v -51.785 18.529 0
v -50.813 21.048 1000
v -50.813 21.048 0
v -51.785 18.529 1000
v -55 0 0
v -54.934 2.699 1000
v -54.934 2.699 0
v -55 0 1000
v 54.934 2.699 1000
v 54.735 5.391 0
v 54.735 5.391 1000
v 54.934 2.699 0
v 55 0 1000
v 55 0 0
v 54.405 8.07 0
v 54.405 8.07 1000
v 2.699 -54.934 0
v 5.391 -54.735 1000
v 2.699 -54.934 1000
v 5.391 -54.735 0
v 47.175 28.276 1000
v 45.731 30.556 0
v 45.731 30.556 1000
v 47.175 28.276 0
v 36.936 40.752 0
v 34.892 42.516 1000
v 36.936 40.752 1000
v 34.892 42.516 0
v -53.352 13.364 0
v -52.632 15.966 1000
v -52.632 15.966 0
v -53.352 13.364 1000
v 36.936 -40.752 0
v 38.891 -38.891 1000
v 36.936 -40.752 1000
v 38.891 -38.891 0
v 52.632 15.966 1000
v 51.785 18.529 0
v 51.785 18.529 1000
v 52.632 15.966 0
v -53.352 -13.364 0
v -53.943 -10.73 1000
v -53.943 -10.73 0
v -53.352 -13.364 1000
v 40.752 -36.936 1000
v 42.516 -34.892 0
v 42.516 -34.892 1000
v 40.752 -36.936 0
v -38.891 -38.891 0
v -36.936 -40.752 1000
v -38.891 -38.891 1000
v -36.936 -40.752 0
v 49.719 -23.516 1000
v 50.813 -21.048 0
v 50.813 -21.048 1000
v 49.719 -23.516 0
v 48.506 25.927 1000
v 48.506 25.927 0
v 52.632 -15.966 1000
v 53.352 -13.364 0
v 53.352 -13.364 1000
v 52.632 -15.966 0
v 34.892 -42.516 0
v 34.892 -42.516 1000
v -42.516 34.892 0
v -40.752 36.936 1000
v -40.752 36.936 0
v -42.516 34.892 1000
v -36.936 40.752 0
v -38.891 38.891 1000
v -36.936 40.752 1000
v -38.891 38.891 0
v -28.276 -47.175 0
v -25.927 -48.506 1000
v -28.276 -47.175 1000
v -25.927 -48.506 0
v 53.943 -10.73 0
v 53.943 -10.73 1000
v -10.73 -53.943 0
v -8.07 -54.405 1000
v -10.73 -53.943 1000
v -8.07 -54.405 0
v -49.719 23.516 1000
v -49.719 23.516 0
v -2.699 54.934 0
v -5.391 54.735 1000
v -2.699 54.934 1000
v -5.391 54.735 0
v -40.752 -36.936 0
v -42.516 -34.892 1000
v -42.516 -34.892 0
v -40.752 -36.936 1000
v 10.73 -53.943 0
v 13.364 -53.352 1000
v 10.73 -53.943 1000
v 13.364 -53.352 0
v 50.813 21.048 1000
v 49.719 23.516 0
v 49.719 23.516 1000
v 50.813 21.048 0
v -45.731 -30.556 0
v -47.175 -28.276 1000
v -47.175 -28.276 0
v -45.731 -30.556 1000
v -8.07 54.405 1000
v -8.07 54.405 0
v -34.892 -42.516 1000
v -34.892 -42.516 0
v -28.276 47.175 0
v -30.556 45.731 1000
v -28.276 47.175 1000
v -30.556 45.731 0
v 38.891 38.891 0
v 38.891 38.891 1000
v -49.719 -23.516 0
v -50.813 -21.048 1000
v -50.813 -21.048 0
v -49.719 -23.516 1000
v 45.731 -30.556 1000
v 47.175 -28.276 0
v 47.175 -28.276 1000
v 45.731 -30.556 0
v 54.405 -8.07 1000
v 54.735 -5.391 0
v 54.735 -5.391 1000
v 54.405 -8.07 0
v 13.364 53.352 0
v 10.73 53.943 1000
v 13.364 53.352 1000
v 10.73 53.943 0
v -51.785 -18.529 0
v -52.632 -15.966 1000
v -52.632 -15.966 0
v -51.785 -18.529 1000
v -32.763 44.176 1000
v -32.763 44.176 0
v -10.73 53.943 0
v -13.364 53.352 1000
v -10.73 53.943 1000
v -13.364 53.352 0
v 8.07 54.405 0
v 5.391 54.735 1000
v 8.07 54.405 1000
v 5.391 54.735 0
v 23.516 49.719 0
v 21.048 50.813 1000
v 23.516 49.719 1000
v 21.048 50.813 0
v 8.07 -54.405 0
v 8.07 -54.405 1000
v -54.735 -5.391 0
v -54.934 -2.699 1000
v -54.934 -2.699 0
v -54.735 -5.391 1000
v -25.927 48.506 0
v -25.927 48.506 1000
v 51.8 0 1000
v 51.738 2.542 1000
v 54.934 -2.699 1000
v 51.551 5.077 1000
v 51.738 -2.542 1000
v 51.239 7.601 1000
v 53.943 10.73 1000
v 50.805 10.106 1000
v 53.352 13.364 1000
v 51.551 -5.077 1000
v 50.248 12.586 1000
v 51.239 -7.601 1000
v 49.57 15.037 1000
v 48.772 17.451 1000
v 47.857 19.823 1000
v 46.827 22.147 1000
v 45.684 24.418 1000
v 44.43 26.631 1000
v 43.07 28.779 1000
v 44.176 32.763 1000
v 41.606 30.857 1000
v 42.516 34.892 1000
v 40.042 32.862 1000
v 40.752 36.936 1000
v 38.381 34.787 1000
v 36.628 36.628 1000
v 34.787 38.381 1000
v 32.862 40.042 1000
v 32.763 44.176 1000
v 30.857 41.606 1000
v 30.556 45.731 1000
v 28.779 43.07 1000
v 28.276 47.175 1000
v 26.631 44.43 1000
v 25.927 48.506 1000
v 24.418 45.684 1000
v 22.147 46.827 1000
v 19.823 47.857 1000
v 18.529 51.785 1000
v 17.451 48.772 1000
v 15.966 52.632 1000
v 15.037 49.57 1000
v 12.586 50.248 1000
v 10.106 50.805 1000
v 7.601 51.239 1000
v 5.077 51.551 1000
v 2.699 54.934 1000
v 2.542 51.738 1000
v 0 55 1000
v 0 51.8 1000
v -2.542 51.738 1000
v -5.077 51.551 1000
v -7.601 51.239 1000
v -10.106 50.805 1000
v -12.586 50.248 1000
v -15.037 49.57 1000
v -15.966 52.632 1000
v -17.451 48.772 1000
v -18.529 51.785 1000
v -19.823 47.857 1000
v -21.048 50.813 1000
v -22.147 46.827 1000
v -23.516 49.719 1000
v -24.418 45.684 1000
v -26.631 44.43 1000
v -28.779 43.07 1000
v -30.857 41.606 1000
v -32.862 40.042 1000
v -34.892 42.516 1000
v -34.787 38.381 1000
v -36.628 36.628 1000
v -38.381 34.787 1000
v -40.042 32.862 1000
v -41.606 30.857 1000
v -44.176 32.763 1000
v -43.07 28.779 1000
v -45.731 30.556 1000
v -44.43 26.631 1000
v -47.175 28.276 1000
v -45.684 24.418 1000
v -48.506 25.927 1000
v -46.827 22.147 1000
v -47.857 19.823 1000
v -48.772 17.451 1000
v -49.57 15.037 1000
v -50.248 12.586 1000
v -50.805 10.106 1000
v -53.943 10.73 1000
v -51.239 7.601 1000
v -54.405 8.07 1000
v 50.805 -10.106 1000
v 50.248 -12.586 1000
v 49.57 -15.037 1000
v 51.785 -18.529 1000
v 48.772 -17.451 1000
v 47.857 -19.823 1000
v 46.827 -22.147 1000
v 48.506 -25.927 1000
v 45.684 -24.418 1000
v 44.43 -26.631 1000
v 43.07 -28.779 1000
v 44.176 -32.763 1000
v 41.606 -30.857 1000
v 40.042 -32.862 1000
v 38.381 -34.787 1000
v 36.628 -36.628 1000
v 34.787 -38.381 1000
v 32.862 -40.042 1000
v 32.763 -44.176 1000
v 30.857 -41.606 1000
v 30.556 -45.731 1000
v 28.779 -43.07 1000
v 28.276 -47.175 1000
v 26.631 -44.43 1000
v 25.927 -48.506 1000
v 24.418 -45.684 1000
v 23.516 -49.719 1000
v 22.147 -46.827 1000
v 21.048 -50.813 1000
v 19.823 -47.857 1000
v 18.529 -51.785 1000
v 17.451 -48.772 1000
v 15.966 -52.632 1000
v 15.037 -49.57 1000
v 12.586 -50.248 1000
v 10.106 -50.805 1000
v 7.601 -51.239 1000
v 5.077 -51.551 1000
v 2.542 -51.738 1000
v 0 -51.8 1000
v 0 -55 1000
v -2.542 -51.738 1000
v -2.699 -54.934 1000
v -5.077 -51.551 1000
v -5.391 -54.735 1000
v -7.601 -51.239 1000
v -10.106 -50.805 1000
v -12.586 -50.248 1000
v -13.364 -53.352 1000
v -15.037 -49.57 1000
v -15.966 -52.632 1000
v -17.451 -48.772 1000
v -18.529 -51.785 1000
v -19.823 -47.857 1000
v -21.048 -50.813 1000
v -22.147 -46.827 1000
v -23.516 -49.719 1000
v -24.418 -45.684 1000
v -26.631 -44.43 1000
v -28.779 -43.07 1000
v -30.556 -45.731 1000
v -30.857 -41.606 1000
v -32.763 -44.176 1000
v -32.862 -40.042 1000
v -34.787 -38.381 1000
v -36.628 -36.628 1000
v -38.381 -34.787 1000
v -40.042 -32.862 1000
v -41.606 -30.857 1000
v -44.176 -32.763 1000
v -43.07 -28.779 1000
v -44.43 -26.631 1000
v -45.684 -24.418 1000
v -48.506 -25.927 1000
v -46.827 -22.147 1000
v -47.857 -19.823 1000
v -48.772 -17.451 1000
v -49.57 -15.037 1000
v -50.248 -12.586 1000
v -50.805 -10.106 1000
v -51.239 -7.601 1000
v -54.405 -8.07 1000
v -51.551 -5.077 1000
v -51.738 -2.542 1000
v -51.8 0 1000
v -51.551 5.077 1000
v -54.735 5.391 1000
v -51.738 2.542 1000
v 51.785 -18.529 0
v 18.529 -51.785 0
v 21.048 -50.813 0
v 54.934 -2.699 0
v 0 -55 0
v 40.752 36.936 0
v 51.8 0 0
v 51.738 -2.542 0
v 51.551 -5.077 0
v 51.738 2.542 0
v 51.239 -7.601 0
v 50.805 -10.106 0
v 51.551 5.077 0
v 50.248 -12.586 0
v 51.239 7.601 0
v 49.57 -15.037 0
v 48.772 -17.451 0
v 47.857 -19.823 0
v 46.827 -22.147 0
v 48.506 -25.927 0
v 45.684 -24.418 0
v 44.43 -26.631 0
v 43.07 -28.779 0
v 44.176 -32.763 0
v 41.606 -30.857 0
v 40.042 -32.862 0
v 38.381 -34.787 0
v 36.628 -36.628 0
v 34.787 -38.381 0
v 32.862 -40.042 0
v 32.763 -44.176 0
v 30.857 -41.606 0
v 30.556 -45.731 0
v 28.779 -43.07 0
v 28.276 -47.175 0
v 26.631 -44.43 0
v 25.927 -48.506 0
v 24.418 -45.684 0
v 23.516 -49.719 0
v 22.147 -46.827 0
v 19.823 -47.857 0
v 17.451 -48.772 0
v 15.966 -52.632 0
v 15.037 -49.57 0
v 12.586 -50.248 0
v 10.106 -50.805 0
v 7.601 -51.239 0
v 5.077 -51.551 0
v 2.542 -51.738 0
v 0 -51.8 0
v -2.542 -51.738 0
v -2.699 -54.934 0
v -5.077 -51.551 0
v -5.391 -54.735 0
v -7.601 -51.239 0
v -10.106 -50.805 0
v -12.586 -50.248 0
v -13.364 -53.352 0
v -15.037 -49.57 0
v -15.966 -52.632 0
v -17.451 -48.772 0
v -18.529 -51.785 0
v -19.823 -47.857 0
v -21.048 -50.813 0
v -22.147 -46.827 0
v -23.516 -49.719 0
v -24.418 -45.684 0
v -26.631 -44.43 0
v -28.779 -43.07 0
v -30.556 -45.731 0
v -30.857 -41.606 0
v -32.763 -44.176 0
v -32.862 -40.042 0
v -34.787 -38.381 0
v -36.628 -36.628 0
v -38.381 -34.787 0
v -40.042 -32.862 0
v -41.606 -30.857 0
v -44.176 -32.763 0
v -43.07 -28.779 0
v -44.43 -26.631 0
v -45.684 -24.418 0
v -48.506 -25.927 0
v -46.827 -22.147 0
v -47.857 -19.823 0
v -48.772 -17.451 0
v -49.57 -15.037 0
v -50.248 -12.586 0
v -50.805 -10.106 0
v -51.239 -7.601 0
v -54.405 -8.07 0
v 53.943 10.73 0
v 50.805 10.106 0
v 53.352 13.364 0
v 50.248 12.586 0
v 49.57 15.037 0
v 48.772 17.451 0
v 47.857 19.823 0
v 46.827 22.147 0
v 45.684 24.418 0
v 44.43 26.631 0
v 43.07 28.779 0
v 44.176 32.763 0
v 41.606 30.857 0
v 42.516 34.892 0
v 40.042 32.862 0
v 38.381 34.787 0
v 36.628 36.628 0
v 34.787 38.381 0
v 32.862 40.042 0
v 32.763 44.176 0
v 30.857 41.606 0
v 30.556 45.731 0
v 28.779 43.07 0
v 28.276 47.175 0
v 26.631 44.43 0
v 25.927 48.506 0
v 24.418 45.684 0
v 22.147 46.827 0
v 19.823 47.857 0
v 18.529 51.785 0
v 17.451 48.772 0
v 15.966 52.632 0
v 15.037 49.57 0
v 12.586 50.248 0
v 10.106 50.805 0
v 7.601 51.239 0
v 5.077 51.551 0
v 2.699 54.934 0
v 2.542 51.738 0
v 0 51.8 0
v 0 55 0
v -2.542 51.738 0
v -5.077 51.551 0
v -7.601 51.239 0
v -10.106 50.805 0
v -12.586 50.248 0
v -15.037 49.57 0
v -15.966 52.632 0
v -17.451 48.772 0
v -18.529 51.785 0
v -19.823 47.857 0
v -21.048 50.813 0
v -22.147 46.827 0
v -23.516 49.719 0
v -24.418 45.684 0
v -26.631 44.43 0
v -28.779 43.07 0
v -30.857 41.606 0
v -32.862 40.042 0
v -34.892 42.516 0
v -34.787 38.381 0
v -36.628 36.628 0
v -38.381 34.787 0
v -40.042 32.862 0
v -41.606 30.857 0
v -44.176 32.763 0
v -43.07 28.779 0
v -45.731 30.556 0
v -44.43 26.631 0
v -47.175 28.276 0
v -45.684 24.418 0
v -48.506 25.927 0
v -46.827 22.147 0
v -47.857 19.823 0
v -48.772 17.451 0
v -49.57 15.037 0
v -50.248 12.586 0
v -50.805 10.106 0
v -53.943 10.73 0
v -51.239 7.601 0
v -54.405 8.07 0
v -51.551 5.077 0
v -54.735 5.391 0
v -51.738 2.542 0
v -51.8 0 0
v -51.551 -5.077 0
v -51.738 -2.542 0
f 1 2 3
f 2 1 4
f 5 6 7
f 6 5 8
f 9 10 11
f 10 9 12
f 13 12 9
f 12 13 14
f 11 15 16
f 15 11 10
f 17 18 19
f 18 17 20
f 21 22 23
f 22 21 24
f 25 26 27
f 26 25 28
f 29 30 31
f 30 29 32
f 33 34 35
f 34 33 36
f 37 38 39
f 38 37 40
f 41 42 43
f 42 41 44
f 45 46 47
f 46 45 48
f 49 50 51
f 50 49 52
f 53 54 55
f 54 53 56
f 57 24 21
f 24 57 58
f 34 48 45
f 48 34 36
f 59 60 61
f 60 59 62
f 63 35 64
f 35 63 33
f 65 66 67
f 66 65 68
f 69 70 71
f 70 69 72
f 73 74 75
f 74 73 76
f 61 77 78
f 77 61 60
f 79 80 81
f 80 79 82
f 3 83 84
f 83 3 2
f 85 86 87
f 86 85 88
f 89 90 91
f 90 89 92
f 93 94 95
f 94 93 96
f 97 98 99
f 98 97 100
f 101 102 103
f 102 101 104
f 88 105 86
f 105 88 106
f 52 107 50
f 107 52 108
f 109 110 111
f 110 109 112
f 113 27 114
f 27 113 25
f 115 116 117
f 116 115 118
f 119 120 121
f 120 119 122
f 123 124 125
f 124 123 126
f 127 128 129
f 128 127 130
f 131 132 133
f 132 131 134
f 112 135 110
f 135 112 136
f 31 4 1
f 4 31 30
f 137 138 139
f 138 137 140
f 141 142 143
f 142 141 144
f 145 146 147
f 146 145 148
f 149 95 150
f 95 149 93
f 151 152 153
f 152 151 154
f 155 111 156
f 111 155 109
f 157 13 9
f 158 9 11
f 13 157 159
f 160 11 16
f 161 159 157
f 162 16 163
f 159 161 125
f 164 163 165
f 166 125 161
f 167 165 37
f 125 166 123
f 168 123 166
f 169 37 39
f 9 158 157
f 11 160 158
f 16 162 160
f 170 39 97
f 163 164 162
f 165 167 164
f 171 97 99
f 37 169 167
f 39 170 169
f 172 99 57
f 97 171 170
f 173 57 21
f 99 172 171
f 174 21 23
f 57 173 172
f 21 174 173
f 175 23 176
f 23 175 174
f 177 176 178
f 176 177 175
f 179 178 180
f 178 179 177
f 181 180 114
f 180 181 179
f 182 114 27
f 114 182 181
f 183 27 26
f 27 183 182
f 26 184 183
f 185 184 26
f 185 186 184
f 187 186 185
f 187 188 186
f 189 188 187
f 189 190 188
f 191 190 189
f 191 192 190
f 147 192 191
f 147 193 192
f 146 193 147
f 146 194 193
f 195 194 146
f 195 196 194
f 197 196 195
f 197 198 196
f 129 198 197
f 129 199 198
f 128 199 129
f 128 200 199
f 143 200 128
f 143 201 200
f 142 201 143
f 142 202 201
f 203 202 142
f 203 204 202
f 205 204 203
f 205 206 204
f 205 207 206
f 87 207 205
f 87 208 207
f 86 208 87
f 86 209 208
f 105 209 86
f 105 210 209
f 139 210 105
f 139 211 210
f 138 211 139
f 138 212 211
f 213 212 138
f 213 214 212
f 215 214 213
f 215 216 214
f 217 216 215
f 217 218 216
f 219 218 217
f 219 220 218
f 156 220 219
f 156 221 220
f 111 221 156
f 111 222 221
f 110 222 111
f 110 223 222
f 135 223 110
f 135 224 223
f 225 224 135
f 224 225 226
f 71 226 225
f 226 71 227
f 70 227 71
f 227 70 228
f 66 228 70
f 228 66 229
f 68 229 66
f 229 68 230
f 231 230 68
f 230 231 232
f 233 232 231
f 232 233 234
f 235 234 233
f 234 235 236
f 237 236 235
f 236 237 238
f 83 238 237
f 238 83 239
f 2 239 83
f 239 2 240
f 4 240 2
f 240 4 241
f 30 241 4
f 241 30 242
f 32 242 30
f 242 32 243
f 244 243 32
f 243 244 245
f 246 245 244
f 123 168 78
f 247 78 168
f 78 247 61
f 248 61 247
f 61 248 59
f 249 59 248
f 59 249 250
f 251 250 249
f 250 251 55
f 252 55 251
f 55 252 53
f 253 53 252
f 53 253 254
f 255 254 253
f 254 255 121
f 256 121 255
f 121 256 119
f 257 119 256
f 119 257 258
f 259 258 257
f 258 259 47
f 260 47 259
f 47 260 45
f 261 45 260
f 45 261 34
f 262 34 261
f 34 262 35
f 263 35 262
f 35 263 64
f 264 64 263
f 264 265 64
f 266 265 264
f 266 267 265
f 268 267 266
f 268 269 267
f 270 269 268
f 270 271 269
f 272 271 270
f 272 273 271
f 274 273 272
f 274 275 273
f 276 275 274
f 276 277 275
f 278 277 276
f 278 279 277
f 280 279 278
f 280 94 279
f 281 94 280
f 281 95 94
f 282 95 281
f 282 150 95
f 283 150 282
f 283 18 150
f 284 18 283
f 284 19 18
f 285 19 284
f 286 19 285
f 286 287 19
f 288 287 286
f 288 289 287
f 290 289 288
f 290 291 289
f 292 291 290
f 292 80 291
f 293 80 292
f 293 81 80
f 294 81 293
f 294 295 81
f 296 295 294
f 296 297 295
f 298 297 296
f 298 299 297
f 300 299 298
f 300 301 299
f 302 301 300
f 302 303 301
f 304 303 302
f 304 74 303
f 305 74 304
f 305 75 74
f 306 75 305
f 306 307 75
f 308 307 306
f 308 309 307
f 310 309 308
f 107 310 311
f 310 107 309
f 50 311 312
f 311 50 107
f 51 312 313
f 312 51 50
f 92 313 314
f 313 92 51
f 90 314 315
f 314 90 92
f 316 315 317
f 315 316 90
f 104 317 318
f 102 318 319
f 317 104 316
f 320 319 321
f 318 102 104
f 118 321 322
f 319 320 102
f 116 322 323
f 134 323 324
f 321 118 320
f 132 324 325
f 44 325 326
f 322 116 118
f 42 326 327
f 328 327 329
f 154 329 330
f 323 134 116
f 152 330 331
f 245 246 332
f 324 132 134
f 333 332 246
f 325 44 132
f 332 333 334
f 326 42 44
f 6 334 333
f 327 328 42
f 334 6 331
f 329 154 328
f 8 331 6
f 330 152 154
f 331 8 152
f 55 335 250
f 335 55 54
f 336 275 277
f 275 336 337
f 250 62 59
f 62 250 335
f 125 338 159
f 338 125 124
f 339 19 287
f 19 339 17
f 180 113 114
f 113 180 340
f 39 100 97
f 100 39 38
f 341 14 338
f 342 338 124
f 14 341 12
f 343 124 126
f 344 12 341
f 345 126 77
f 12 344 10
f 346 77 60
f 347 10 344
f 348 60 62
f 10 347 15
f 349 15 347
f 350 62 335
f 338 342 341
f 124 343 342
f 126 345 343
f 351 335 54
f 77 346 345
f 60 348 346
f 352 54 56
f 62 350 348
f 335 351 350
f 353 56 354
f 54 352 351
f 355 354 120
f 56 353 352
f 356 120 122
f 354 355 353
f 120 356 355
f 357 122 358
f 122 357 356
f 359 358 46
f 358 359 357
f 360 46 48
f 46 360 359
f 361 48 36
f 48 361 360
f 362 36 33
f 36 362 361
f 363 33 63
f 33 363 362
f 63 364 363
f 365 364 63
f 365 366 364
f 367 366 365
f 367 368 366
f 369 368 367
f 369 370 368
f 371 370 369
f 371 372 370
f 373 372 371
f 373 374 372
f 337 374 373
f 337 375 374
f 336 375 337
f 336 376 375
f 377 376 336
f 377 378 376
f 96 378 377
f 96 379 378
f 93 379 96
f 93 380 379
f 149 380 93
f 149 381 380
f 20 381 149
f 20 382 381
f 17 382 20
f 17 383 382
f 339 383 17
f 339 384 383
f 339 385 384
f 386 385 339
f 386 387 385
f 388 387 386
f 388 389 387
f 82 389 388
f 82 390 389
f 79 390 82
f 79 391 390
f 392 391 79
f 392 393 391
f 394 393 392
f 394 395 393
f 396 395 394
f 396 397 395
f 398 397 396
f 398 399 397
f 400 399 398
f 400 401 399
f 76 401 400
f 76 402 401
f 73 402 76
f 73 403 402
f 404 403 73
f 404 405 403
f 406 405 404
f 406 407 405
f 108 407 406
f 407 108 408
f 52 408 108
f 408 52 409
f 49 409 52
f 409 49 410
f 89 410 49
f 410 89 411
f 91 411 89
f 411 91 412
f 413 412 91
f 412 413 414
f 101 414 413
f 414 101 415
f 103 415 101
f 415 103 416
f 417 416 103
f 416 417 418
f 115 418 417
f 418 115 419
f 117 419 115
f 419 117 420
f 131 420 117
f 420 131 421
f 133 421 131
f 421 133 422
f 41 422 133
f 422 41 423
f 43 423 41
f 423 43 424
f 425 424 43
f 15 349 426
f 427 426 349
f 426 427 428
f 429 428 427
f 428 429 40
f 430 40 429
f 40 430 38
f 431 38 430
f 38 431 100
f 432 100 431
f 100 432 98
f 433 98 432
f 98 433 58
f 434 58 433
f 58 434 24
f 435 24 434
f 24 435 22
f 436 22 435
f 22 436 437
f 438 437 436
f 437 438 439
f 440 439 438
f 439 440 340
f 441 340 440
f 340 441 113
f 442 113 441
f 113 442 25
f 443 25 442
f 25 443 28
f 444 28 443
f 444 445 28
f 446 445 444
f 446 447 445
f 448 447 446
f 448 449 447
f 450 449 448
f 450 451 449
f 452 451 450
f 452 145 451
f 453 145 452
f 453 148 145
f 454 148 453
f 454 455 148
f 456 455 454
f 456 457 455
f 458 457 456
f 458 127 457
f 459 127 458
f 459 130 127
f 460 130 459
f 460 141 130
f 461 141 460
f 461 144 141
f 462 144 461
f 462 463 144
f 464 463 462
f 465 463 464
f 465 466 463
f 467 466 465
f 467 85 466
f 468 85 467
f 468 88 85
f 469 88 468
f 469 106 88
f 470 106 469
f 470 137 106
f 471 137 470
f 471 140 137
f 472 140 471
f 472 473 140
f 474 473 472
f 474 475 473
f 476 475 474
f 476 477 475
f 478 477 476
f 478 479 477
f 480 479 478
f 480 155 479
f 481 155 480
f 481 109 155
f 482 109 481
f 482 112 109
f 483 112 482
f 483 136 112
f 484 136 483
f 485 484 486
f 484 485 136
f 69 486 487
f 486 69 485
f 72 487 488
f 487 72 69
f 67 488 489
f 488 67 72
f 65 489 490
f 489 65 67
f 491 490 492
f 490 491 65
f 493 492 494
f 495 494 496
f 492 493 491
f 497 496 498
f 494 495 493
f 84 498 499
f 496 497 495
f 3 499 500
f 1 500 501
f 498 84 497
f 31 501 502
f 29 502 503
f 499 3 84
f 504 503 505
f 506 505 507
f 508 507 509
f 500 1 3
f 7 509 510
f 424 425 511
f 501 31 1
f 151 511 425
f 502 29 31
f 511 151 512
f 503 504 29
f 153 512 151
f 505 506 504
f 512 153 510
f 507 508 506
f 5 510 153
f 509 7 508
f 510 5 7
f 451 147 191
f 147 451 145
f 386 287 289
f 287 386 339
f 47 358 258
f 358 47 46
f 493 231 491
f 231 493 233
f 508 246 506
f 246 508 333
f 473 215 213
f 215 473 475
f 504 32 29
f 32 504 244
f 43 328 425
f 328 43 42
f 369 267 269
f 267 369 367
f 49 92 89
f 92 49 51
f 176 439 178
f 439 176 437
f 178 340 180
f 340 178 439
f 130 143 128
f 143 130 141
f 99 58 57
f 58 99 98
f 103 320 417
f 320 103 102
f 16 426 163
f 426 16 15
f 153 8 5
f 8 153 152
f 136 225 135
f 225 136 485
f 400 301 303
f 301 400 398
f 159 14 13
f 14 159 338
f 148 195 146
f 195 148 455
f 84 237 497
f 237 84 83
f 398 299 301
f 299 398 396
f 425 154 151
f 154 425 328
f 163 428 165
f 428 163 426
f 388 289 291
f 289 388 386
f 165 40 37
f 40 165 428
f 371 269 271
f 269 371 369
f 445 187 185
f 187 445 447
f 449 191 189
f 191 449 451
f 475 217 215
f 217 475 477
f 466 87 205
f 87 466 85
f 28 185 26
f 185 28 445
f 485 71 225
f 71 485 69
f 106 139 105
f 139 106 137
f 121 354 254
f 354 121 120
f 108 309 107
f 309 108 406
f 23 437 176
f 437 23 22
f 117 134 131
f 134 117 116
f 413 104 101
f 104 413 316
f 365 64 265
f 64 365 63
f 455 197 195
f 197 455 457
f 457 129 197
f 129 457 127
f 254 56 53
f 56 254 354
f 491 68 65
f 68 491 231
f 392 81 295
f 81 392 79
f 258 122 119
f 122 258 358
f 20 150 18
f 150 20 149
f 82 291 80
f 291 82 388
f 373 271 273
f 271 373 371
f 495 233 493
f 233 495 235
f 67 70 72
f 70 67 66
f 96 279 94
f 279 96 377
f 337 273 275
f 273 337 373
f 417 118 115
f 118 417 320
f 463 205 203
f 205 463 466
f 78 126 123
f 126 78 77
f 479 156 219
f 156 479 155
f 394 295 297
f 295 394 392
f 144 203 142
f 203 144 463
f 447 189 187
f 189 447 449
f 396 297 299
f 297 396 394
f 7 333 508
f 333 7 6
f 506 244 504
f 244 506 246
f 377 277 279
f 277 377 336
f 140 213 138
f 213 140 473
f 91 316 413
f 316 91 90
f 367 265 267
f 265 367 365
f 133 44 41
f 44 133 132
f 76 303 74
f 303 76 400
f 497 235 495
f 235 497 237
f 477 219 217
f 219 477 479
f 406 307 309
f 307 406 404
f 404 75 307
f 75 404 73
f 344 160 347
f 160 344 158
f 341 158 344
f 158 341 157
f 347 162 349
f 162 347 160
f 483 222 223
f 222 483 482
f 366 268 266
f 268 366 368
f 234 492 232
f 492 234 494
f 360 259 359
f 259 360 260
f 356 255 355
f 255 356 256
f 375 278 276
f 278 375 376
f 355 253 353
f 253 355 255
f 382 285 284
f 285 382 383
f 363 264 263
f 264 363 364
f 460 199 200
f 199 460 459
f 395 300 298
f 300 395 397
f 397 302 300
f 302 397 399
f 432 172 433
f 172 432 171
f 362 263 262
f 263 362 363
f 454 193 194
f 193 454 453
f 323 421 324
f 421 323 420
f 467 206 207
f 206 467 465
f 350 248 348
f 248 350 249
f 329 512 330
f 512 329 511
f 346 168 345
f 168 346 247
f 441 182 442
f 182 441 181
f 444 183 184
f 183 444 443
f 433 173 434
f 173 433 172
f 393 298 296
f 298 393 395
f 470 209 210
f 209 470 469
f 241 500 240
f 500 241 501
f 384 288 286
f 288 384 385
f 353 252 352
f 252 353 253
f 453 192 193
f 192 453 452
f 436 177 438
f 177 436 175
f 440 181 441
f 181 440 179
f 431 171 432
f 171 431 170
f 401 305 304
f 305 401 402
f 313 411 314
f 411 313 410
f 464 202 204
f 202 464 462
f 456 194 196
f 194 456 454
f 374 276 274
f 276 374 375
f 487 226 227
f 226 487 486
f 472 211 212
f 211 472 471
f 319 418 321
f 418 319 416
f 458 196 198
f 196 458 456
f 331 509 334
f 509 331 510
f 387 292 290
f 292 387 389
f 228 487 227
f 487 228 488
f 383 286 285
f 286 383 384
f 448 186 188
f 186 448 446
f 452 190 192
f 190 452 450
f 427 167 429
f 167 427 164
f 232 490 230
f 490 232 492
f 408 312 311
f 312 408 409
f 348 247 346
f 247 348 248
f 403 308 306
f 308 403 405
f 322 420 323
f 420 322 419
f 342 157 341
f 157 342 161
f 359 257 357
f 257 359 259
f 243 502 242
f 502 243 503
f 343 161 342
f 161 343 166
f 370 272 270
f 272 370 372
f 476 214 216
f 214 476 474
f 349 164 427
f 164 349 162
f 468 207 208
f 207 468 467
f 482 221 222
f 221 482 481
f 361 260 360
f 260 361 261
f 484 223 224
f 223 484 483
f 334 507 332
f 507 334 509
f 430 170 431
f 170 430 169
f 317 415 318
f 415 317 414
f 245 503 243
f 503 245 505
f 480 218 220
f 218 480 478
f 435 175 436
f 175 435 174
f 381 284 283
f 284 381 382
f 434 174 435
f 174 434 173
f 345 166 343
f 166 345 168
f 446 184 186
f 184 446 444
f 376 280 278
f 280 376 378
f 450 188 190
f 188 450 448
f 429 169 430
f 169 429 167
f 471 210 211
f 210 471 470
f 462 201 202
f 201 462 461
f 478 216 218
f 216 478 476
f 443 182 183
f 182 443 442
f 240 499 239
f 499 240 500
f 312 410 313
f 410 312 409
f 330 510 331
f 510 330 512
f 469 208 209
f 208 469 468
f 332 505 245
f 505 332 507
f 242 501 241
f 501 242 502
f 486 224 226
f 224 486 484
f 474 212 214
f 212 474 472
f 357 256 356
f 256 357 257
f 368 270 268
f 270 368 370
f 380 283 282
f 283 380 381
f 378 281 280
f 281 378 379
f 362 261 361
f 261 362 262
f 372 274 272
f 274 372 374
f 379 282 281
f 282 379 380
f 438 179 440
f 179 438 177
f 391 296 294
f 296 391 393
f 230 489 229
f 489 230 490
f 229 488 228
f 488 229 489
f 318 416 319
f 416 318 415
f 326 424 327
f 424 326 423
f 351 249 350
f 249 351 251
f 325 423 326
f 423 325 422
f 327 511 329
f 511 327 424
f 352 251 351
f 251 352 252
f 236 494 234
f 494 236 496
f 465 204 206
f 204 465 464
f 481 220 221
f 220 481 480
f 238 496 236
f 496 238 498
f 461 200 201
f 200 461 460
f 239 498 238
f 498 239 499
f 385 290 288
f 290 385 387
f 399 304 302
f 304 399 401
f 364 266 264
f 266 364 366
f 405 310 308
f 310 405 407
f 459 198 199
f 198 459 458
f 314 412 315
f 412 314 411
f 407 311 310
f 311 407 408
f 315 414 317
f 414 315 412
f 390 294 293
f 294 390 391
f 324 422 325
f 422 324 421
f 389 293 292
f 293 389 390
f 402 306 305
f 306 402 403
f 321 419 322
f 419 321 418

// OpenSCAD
$fn=128;

// HT pipe parameters (approximate for HT 110)
pipe_length = 1000;          // mm
outer_diameter = 110;        // mm
wall_thickness = 3.2;        // mm (typical for HT 110)
inner_diameter = outer_diameter - 2*wall_thickness;

module ht_pipe(od, id, len) {
    difference() {
        cylinder(h=len, d=od);
        translate([0,0,-0.5])
            cylinder(h=len+1, d=id);
    }
}

ht_pipe(outer_diameter, inner_diameter, pipe_length);
